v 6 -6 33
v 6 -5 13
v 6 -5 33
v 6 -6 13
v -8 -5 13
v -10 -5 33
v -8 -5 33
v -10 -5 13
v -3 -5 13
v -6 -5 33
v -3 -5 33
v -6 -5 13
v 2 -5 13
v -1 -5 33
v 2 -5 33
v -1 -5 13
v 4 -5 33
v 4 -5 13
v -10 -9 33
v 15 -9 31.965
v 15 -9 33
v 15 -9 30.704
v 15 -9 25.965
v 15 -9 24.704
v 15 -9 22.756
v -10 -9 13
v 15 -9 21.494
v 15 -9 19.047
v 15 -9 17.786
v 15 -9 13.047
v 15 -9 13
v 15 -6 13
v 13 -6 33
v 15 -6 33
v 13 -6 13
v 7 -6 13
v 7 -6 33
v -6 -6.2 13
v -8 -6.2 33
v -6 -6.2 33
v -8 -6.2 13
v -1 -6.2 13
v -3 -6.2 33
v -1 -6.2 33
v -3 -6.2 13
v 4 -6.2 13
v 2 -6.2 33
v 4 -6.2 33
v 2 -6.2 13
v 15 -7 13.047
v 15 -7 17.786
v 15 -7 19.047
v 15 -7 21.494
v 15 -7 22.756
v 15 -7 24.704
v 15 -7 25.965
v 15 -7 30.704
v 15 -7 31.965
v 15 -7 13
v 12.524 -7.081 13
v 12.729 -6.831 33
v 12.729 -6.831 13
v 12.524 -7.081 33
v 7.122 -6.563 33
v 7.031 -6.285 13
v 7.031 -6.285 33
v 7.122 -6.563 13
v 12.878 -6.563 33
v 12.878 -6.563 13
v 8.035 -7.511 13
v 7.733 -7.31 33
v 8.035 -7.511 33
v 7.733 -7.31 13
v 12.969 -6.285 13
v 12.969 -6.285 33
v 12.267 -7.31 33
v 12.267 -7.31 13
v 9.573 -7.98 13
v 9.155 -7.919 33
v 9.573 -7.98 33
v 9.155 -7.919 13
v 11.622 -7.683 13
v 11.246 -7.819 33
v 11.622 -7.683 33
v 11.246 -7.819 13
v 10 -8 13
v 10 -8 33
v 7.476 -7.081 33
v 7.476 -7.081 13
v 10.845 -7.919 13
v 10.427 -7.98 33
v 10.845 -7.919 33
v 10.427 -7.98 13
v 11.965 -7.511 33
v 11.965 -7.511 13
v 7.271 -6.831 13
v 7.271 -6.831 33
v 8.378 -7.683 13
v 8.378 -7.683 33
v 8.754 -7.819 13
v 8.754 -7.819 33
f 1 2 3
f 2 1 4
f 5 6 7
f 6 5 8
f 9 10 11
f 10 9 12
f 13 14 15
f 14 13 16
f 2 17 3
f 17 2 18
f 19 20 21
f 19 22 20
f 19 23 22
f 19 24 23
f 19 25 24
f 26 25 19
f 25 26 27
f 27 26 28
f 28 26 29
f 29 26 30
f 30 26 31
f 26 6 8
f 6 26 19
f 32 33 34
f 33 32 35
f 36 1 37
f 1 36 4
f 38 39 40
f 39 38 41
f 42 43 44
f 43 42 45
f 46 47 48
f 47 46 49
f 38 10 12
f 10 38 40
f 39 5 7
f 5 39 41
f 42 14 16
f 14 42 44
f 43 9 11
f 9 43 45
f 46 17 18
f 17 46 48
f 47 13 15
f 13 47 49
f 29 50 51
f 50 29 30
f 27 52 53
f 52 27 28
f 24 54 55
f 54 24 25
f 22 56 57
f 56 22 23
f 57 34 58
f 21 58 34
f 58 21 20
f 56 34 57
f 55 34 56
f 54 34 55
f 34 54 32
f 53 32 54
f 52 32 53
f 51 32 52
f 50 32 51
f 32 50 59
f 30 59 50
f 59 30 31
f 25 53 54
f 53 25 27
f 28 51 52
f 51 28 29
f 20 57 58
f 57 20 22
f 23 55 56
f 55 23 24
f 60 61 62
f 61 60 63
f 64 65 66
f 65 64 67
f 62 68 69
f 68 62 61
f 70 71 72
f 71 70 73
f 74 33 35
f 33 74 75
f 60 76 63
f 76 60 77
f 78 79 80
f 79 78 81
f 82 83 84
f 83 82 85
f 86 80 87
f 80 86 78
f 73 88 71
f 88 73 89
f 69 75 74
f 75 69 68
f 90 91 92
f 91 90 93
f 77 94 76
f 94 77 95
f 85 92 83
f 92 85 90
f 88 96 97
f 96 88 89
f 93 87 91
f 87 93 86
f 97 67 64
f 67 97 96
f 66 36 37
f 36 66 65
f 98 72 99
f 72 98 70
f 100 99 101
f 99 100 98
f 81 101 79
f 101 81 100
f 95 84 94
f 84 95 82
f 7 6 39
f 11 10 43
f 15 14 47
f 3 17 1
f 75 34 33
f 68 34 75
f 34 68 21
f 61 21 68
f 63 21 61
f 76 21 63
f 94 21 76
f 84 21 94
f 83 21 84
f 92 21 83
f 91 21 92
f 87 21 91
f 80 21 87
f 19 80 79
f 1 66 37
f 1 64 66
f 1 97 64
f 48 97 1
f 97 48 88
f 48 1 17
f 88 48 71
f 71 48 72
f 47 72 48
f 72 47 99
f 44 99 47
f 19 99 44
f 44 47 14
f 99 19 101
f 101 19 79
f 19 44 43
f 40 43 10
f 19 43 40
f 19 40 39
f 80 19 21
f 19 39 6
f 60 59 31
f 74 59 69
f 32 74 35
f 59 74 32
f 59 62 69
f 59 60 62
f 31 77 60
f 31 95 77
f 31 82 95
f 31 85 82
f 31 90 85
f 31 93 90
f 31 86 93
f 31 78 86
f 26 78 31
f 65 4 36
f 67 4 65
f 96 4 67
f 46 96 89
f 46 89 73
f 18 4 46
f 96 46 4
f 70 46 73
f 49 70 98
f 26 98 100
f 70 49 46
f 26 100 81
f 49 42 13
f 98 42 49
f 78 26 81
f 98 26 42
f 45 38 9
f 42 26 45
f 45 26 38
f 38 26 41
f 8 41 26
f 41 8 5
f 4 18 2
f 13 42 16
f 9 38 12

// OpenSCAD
// file: ../Parts/rounder.scad
// rounder.scad
// cutting tool for rounding off corners with a cylinder

//---------------------
module rounder(
r=10,   // radius
h=10,   // height
f=22,    // $fn
extra=0.01  // extra size for the cube
){

difference(){
  translate([-extra,-extra,-extra])
  cube([r+extra,r+extra,h+2*extra]);
  translate([r,r,-1])
  cylinder(r=r,h=h+2,$fn=f);
}

}

//========================

rounder();

//========================
// file: ../Parts/fan.scad
//=================================================================================
// fan.scad
// Model for EK-Vardar EVO 120ER fan
// 2200 rpm, 12v, 2.16 watt, 25 to 100% duty, 4-pin header [gnd +12 pwm tach]?
// 120 x 120 x 25 mm nominal
// Max Airflow 77 CFM  = 131 m^3/hour
// Static Pressure 3.16 mm H2O = 31 Pa
// Noise 33.5 dBa at 100% pwm
//
// Air exits on the side with the spider.
//
// Dr Tom Flint, 6 Dec 2020
//=================================================================================

//-------------------------------------------------------
module brace(){
// fan and radiator
t1=4.25;   // thickness box intake side
t2=17.7;   // thickness of circular section
t3=4.0;    // thickness box outlet side
t4=t1+t2+t3;

  intersection(){
    rotate([0,-90,0])
    difference(){ 
      cylinder(r=7.8,h=t4,$fn=22);
      cylinder(r=5.5,h=t4,$fn=22);
    } 
    translate([-t4,-2,-2])
    cube([ t4,12,12]);
  }
}

//---------------------------------------------
module fan(tol=0,holes=1){

// fan and radiator
t1=4.25;   // thickness box intake side
t2=17.7;   // thickness of circular section
t3=4.0;    // thickness box outlet side
t4=t1+t2+t3;
 
  // Fan body
if(holes==1){
  difference(){
    union(){
      translate([-t1,0,0])
      cube([t1+tol,121+tol,120+tol]);
      translate([-(t1+t2),60,60])
      rotate([0,90,0])
      cylinder(r=60,h=t2,$fn=88);  
      translate([-t4,0,0])
      cube([t3+tol,120+tol,120+tol]);
    }
    // mark the openings
    translate([-t4-1,60,60])
    rotate([0,90,0])
    difference(){
      cylinder(r=115/2,h=t4+2,$fn=88);  
      translate([0,0,-1])
      cylinder(r=53/2,h=t4+4,$fn=88);  
    }
    if(1){
      // Corner screws
      translate([1,7,7])
      rotate([0,-90,0])
      cylinder(r=1.45,h=t4+2,$fn=22);

      translate([1,120-7,7])  
      rotate([0,-90,0])
      cylinder(r=1.6,h=t4+2,$fn=22);

      translate([1,7,120-7])
      rotate([0,-90,0])
      cylinder(r=1.45,h=t4+2,$fn=22);
      
      translate([1,120-7,120-7])
      rotate([0,-90,0])
      cylinder(r=1.45,h=t4+2,$fn=22);
    }

  }
  // spider
    translate([0,60,60])
    for(i=[0:3]){
      rotate([i*90,0,0])
      hull(){
        translate([-t4,0,20])
        rotate([0,90,0])
        cylinder(r=3.5,h=4,$fn=88);  
        translate([-t4,-48,46])
        rotate([0,90,0])
        cylinder(r=3.5,h=4,$fn=88);  
      }
    }
  
}else{
    union(){
      translate([-t1,0,0])
      cube([t1+tol,121+tol,120+tol]);
      translate([-(t1+t2),60,60])
      rotate([0,90,0])
      cylinder(r=60,h=t2,$fn=88);  
      translate([-t4,0,0])
      cube([t3+tol,120+tol,120+tol]);
    }
}

if(0){
  // Corner screws
  translate([0,7,7])
  rotate([0,-90,0])
  cylinder(r=1.45,h=t4,$fn=22);

  translate([0,120-7,7])  
  rotate([0,-90,0])
  cylinder(r=1.6,h=t4,$fn=22);

  translate([0,7,120-7])
  rotate([0,-90,0])
  cylinder(r=1.45,h=t4,$fn=22);
  
  translate([0,120-7,120-7])
  rotate([0,-90,0])
  cylinder(r=1.45,h=t4,$fn=22);
}

  // Corner braces
  translate([0,7,7])
  brace();
  translate([0,120-7,7])
  rotate([90,0,0])
  brace();
  translate([0,120-7,120-7])
  rotate([180,0,0])
  brace();
  translate([0,7,120-7])
  rotate([-90,0,0])
  brace();

  // reminder for wiring
  color("red")
  translate([0,120-7,15.5])
  scale([1,4,1])
  rotate([0,90,0])
  cylinder(r=0.7,h=10,$fn=22);
  
  
}

//====================================================================================

fan();


//====================================================================================
// main file
//=================================================================================
// bathfan.scad
//
// Dr Tom Flint, 6 Dec 2020
//=================================================================================

use <../Parts/fan.scad>
use <../Parts/rounder.scad>
use <../Fractals/Lsystem.scad>


// fan and radiator
t1=4.25;   // thickness box intake side
t2=17.7;   // thickness of circular section
t3=4.0;    // thickness box outlet side
t4=t1+t2+t3;


//-------------------------------------------------------
module bathfan1(){

      // top post
      difference(){
        union(){
          translate([-t1-t2+0.15,-1,120-12])
          cube([t2-0.25,13,13]);
          translate([0,-1,120-12])
          cube([6,13,13]);
          translate([-t4-6,-1,120-12])
          cube([6,13,13]);
          translate([-t4-6,-1,120])
          cube([t4+12,13,6]);
          translate([-t4-6,-1-4,120-12])
          cube([t4+12,4,18]);
        }
        // Corner screws
        translate([8,7,120-7])
        rotate([0,-90,0])
        cylinder(r=1.8,h=t4+16,$fn=22);
        translate([8,12,120+6])
        rotate([0,-90,0])
        rotate([0,0,180])
        rounder(r=5,h=t4+16,$fn=22);
      }


      // bottom post
      difference(){
        union(){
          translate([-t1-t2+0.15,-1,-1])
          cube([t2-0.25,13,13]);
          translate([0,-1,-1])
          cube([6,13,13]);
          translate([-t4-6,-1,-1])
          cube([6,13,13]);
          translate([-t4-6,-1,-6])
          cube([t4+12,13,6]);
          translate([-t4-6,-1-4,-6])
          cube([t4+12,4,18]);
        }
        // Corner screws
        translate([8,7,7])
        rotate([0,-90,0])
        cylinder(r=1.8,h=t4+16,$fn=22);
        translate([8,12,-6])
        rotate([0,-90,0])
        rotate([0,0,-90])
        rounder(r=5,h=t4+16,$fn=22);
      }
      
      // vertical post on intake side (away from spider)
      translate([-10,-5,-6])
      cube([16,5,120+8]);
      
      // interlock for material change
      for(i=[1:4])
      translate([-t4-6,-1-4-1.2,120-14+i*4])
      cube([t4+12,1.2,2]);

      for(i=[1:4])
      translate([-t4-6,-1-4-1.2,-8+i*4])
      cube([t4+12,1.2,2]);

      for(i=[0:2])
      translate([-8+i*5,-6.2,10])
      cube([2,2,100]);

    // try a soft gasket / lip
    translate([53,-6,60])
    cube([2,3,116],center=true);  
    translate([45,-6,60])
    cube([2,3,128],center=true);  

}

//-------------------------------------------------------
module bathfan2(){

  difference(){
    union(){
      translate([-t4-6,-1-4-4,120-12])
      cube([t4+12,4,18]);

      translate([-10,-5-4,-6])
      cube([16,5,120+12]);

      translate([-t4-6,-1-4-4,-6])
      cube([t4+12,4,18]);

      translate([6,-5-4,-6])
      cube([50,3,120+12]);
    }
    bathfan1();

    translate([10,-6,-6-1])
    scale([1.5,1,1])
    cylinder(r=2,h=120+12+2,$fn=44);

    translate([40,-6,-6-1])
    scale([1.5,1,1])
    cylinder(r=2,h=120+12+2,$fn=44);
    
    translate([49,-4,2])
    rotate([90,0,0])
    cylinder(r=1.6,h=6,$fn=44);

    translate([56,-4,-6])
    rotate([90,0,0])
    rotate([0,0,90])
    rounder(r=10,h=6,f=44);
    
    translate([49,-4,120-2])
    rotate([90,0,0])
    cylinder(r=1.6,h=6,$fn=44);

    translate([56,-4,120+6])
    rotate([90,0,0])
    rotate([0,0,180])
    rounder(r=10,h=6,f=44);
    
    translate([49,-4,60])
    rotate([90,0,0])
    cylinder(r=1.6,h=6,$fn=44);


    difference(){
      translate([25,-10,60])
      cube([20,12,114],center=true);  

      translate([25,-2,60])
      rotate([90,0,0])
      rotate([0,0,18])
      linear_extrude(height=12,convexity=10)
//      scale([5,5])
      scale([6,6])
      penrose_tiling(n=5, w=0.2);
    }
      // recess the penrose tile
      translate([25,-4,60])
      cube([20,6,114],center=true);  
  
    // try a soft gasket / lip
    translate([53,-6,60])
    cube([2,3,116],center=true);  
    translate([45,-6,60])
    cube([2,3,128],center=true);  
    
  }
}

//============================================================




if(0){
  color("gray")
  fan();
}

intersection(){
  
if(0){
  color("cyan")
  bathfan1();
}

if(1){
  bathfan2();
}
color("cyan")
translate([-10,-21,13])
cube([25,20,20]);
}



//============================================================
